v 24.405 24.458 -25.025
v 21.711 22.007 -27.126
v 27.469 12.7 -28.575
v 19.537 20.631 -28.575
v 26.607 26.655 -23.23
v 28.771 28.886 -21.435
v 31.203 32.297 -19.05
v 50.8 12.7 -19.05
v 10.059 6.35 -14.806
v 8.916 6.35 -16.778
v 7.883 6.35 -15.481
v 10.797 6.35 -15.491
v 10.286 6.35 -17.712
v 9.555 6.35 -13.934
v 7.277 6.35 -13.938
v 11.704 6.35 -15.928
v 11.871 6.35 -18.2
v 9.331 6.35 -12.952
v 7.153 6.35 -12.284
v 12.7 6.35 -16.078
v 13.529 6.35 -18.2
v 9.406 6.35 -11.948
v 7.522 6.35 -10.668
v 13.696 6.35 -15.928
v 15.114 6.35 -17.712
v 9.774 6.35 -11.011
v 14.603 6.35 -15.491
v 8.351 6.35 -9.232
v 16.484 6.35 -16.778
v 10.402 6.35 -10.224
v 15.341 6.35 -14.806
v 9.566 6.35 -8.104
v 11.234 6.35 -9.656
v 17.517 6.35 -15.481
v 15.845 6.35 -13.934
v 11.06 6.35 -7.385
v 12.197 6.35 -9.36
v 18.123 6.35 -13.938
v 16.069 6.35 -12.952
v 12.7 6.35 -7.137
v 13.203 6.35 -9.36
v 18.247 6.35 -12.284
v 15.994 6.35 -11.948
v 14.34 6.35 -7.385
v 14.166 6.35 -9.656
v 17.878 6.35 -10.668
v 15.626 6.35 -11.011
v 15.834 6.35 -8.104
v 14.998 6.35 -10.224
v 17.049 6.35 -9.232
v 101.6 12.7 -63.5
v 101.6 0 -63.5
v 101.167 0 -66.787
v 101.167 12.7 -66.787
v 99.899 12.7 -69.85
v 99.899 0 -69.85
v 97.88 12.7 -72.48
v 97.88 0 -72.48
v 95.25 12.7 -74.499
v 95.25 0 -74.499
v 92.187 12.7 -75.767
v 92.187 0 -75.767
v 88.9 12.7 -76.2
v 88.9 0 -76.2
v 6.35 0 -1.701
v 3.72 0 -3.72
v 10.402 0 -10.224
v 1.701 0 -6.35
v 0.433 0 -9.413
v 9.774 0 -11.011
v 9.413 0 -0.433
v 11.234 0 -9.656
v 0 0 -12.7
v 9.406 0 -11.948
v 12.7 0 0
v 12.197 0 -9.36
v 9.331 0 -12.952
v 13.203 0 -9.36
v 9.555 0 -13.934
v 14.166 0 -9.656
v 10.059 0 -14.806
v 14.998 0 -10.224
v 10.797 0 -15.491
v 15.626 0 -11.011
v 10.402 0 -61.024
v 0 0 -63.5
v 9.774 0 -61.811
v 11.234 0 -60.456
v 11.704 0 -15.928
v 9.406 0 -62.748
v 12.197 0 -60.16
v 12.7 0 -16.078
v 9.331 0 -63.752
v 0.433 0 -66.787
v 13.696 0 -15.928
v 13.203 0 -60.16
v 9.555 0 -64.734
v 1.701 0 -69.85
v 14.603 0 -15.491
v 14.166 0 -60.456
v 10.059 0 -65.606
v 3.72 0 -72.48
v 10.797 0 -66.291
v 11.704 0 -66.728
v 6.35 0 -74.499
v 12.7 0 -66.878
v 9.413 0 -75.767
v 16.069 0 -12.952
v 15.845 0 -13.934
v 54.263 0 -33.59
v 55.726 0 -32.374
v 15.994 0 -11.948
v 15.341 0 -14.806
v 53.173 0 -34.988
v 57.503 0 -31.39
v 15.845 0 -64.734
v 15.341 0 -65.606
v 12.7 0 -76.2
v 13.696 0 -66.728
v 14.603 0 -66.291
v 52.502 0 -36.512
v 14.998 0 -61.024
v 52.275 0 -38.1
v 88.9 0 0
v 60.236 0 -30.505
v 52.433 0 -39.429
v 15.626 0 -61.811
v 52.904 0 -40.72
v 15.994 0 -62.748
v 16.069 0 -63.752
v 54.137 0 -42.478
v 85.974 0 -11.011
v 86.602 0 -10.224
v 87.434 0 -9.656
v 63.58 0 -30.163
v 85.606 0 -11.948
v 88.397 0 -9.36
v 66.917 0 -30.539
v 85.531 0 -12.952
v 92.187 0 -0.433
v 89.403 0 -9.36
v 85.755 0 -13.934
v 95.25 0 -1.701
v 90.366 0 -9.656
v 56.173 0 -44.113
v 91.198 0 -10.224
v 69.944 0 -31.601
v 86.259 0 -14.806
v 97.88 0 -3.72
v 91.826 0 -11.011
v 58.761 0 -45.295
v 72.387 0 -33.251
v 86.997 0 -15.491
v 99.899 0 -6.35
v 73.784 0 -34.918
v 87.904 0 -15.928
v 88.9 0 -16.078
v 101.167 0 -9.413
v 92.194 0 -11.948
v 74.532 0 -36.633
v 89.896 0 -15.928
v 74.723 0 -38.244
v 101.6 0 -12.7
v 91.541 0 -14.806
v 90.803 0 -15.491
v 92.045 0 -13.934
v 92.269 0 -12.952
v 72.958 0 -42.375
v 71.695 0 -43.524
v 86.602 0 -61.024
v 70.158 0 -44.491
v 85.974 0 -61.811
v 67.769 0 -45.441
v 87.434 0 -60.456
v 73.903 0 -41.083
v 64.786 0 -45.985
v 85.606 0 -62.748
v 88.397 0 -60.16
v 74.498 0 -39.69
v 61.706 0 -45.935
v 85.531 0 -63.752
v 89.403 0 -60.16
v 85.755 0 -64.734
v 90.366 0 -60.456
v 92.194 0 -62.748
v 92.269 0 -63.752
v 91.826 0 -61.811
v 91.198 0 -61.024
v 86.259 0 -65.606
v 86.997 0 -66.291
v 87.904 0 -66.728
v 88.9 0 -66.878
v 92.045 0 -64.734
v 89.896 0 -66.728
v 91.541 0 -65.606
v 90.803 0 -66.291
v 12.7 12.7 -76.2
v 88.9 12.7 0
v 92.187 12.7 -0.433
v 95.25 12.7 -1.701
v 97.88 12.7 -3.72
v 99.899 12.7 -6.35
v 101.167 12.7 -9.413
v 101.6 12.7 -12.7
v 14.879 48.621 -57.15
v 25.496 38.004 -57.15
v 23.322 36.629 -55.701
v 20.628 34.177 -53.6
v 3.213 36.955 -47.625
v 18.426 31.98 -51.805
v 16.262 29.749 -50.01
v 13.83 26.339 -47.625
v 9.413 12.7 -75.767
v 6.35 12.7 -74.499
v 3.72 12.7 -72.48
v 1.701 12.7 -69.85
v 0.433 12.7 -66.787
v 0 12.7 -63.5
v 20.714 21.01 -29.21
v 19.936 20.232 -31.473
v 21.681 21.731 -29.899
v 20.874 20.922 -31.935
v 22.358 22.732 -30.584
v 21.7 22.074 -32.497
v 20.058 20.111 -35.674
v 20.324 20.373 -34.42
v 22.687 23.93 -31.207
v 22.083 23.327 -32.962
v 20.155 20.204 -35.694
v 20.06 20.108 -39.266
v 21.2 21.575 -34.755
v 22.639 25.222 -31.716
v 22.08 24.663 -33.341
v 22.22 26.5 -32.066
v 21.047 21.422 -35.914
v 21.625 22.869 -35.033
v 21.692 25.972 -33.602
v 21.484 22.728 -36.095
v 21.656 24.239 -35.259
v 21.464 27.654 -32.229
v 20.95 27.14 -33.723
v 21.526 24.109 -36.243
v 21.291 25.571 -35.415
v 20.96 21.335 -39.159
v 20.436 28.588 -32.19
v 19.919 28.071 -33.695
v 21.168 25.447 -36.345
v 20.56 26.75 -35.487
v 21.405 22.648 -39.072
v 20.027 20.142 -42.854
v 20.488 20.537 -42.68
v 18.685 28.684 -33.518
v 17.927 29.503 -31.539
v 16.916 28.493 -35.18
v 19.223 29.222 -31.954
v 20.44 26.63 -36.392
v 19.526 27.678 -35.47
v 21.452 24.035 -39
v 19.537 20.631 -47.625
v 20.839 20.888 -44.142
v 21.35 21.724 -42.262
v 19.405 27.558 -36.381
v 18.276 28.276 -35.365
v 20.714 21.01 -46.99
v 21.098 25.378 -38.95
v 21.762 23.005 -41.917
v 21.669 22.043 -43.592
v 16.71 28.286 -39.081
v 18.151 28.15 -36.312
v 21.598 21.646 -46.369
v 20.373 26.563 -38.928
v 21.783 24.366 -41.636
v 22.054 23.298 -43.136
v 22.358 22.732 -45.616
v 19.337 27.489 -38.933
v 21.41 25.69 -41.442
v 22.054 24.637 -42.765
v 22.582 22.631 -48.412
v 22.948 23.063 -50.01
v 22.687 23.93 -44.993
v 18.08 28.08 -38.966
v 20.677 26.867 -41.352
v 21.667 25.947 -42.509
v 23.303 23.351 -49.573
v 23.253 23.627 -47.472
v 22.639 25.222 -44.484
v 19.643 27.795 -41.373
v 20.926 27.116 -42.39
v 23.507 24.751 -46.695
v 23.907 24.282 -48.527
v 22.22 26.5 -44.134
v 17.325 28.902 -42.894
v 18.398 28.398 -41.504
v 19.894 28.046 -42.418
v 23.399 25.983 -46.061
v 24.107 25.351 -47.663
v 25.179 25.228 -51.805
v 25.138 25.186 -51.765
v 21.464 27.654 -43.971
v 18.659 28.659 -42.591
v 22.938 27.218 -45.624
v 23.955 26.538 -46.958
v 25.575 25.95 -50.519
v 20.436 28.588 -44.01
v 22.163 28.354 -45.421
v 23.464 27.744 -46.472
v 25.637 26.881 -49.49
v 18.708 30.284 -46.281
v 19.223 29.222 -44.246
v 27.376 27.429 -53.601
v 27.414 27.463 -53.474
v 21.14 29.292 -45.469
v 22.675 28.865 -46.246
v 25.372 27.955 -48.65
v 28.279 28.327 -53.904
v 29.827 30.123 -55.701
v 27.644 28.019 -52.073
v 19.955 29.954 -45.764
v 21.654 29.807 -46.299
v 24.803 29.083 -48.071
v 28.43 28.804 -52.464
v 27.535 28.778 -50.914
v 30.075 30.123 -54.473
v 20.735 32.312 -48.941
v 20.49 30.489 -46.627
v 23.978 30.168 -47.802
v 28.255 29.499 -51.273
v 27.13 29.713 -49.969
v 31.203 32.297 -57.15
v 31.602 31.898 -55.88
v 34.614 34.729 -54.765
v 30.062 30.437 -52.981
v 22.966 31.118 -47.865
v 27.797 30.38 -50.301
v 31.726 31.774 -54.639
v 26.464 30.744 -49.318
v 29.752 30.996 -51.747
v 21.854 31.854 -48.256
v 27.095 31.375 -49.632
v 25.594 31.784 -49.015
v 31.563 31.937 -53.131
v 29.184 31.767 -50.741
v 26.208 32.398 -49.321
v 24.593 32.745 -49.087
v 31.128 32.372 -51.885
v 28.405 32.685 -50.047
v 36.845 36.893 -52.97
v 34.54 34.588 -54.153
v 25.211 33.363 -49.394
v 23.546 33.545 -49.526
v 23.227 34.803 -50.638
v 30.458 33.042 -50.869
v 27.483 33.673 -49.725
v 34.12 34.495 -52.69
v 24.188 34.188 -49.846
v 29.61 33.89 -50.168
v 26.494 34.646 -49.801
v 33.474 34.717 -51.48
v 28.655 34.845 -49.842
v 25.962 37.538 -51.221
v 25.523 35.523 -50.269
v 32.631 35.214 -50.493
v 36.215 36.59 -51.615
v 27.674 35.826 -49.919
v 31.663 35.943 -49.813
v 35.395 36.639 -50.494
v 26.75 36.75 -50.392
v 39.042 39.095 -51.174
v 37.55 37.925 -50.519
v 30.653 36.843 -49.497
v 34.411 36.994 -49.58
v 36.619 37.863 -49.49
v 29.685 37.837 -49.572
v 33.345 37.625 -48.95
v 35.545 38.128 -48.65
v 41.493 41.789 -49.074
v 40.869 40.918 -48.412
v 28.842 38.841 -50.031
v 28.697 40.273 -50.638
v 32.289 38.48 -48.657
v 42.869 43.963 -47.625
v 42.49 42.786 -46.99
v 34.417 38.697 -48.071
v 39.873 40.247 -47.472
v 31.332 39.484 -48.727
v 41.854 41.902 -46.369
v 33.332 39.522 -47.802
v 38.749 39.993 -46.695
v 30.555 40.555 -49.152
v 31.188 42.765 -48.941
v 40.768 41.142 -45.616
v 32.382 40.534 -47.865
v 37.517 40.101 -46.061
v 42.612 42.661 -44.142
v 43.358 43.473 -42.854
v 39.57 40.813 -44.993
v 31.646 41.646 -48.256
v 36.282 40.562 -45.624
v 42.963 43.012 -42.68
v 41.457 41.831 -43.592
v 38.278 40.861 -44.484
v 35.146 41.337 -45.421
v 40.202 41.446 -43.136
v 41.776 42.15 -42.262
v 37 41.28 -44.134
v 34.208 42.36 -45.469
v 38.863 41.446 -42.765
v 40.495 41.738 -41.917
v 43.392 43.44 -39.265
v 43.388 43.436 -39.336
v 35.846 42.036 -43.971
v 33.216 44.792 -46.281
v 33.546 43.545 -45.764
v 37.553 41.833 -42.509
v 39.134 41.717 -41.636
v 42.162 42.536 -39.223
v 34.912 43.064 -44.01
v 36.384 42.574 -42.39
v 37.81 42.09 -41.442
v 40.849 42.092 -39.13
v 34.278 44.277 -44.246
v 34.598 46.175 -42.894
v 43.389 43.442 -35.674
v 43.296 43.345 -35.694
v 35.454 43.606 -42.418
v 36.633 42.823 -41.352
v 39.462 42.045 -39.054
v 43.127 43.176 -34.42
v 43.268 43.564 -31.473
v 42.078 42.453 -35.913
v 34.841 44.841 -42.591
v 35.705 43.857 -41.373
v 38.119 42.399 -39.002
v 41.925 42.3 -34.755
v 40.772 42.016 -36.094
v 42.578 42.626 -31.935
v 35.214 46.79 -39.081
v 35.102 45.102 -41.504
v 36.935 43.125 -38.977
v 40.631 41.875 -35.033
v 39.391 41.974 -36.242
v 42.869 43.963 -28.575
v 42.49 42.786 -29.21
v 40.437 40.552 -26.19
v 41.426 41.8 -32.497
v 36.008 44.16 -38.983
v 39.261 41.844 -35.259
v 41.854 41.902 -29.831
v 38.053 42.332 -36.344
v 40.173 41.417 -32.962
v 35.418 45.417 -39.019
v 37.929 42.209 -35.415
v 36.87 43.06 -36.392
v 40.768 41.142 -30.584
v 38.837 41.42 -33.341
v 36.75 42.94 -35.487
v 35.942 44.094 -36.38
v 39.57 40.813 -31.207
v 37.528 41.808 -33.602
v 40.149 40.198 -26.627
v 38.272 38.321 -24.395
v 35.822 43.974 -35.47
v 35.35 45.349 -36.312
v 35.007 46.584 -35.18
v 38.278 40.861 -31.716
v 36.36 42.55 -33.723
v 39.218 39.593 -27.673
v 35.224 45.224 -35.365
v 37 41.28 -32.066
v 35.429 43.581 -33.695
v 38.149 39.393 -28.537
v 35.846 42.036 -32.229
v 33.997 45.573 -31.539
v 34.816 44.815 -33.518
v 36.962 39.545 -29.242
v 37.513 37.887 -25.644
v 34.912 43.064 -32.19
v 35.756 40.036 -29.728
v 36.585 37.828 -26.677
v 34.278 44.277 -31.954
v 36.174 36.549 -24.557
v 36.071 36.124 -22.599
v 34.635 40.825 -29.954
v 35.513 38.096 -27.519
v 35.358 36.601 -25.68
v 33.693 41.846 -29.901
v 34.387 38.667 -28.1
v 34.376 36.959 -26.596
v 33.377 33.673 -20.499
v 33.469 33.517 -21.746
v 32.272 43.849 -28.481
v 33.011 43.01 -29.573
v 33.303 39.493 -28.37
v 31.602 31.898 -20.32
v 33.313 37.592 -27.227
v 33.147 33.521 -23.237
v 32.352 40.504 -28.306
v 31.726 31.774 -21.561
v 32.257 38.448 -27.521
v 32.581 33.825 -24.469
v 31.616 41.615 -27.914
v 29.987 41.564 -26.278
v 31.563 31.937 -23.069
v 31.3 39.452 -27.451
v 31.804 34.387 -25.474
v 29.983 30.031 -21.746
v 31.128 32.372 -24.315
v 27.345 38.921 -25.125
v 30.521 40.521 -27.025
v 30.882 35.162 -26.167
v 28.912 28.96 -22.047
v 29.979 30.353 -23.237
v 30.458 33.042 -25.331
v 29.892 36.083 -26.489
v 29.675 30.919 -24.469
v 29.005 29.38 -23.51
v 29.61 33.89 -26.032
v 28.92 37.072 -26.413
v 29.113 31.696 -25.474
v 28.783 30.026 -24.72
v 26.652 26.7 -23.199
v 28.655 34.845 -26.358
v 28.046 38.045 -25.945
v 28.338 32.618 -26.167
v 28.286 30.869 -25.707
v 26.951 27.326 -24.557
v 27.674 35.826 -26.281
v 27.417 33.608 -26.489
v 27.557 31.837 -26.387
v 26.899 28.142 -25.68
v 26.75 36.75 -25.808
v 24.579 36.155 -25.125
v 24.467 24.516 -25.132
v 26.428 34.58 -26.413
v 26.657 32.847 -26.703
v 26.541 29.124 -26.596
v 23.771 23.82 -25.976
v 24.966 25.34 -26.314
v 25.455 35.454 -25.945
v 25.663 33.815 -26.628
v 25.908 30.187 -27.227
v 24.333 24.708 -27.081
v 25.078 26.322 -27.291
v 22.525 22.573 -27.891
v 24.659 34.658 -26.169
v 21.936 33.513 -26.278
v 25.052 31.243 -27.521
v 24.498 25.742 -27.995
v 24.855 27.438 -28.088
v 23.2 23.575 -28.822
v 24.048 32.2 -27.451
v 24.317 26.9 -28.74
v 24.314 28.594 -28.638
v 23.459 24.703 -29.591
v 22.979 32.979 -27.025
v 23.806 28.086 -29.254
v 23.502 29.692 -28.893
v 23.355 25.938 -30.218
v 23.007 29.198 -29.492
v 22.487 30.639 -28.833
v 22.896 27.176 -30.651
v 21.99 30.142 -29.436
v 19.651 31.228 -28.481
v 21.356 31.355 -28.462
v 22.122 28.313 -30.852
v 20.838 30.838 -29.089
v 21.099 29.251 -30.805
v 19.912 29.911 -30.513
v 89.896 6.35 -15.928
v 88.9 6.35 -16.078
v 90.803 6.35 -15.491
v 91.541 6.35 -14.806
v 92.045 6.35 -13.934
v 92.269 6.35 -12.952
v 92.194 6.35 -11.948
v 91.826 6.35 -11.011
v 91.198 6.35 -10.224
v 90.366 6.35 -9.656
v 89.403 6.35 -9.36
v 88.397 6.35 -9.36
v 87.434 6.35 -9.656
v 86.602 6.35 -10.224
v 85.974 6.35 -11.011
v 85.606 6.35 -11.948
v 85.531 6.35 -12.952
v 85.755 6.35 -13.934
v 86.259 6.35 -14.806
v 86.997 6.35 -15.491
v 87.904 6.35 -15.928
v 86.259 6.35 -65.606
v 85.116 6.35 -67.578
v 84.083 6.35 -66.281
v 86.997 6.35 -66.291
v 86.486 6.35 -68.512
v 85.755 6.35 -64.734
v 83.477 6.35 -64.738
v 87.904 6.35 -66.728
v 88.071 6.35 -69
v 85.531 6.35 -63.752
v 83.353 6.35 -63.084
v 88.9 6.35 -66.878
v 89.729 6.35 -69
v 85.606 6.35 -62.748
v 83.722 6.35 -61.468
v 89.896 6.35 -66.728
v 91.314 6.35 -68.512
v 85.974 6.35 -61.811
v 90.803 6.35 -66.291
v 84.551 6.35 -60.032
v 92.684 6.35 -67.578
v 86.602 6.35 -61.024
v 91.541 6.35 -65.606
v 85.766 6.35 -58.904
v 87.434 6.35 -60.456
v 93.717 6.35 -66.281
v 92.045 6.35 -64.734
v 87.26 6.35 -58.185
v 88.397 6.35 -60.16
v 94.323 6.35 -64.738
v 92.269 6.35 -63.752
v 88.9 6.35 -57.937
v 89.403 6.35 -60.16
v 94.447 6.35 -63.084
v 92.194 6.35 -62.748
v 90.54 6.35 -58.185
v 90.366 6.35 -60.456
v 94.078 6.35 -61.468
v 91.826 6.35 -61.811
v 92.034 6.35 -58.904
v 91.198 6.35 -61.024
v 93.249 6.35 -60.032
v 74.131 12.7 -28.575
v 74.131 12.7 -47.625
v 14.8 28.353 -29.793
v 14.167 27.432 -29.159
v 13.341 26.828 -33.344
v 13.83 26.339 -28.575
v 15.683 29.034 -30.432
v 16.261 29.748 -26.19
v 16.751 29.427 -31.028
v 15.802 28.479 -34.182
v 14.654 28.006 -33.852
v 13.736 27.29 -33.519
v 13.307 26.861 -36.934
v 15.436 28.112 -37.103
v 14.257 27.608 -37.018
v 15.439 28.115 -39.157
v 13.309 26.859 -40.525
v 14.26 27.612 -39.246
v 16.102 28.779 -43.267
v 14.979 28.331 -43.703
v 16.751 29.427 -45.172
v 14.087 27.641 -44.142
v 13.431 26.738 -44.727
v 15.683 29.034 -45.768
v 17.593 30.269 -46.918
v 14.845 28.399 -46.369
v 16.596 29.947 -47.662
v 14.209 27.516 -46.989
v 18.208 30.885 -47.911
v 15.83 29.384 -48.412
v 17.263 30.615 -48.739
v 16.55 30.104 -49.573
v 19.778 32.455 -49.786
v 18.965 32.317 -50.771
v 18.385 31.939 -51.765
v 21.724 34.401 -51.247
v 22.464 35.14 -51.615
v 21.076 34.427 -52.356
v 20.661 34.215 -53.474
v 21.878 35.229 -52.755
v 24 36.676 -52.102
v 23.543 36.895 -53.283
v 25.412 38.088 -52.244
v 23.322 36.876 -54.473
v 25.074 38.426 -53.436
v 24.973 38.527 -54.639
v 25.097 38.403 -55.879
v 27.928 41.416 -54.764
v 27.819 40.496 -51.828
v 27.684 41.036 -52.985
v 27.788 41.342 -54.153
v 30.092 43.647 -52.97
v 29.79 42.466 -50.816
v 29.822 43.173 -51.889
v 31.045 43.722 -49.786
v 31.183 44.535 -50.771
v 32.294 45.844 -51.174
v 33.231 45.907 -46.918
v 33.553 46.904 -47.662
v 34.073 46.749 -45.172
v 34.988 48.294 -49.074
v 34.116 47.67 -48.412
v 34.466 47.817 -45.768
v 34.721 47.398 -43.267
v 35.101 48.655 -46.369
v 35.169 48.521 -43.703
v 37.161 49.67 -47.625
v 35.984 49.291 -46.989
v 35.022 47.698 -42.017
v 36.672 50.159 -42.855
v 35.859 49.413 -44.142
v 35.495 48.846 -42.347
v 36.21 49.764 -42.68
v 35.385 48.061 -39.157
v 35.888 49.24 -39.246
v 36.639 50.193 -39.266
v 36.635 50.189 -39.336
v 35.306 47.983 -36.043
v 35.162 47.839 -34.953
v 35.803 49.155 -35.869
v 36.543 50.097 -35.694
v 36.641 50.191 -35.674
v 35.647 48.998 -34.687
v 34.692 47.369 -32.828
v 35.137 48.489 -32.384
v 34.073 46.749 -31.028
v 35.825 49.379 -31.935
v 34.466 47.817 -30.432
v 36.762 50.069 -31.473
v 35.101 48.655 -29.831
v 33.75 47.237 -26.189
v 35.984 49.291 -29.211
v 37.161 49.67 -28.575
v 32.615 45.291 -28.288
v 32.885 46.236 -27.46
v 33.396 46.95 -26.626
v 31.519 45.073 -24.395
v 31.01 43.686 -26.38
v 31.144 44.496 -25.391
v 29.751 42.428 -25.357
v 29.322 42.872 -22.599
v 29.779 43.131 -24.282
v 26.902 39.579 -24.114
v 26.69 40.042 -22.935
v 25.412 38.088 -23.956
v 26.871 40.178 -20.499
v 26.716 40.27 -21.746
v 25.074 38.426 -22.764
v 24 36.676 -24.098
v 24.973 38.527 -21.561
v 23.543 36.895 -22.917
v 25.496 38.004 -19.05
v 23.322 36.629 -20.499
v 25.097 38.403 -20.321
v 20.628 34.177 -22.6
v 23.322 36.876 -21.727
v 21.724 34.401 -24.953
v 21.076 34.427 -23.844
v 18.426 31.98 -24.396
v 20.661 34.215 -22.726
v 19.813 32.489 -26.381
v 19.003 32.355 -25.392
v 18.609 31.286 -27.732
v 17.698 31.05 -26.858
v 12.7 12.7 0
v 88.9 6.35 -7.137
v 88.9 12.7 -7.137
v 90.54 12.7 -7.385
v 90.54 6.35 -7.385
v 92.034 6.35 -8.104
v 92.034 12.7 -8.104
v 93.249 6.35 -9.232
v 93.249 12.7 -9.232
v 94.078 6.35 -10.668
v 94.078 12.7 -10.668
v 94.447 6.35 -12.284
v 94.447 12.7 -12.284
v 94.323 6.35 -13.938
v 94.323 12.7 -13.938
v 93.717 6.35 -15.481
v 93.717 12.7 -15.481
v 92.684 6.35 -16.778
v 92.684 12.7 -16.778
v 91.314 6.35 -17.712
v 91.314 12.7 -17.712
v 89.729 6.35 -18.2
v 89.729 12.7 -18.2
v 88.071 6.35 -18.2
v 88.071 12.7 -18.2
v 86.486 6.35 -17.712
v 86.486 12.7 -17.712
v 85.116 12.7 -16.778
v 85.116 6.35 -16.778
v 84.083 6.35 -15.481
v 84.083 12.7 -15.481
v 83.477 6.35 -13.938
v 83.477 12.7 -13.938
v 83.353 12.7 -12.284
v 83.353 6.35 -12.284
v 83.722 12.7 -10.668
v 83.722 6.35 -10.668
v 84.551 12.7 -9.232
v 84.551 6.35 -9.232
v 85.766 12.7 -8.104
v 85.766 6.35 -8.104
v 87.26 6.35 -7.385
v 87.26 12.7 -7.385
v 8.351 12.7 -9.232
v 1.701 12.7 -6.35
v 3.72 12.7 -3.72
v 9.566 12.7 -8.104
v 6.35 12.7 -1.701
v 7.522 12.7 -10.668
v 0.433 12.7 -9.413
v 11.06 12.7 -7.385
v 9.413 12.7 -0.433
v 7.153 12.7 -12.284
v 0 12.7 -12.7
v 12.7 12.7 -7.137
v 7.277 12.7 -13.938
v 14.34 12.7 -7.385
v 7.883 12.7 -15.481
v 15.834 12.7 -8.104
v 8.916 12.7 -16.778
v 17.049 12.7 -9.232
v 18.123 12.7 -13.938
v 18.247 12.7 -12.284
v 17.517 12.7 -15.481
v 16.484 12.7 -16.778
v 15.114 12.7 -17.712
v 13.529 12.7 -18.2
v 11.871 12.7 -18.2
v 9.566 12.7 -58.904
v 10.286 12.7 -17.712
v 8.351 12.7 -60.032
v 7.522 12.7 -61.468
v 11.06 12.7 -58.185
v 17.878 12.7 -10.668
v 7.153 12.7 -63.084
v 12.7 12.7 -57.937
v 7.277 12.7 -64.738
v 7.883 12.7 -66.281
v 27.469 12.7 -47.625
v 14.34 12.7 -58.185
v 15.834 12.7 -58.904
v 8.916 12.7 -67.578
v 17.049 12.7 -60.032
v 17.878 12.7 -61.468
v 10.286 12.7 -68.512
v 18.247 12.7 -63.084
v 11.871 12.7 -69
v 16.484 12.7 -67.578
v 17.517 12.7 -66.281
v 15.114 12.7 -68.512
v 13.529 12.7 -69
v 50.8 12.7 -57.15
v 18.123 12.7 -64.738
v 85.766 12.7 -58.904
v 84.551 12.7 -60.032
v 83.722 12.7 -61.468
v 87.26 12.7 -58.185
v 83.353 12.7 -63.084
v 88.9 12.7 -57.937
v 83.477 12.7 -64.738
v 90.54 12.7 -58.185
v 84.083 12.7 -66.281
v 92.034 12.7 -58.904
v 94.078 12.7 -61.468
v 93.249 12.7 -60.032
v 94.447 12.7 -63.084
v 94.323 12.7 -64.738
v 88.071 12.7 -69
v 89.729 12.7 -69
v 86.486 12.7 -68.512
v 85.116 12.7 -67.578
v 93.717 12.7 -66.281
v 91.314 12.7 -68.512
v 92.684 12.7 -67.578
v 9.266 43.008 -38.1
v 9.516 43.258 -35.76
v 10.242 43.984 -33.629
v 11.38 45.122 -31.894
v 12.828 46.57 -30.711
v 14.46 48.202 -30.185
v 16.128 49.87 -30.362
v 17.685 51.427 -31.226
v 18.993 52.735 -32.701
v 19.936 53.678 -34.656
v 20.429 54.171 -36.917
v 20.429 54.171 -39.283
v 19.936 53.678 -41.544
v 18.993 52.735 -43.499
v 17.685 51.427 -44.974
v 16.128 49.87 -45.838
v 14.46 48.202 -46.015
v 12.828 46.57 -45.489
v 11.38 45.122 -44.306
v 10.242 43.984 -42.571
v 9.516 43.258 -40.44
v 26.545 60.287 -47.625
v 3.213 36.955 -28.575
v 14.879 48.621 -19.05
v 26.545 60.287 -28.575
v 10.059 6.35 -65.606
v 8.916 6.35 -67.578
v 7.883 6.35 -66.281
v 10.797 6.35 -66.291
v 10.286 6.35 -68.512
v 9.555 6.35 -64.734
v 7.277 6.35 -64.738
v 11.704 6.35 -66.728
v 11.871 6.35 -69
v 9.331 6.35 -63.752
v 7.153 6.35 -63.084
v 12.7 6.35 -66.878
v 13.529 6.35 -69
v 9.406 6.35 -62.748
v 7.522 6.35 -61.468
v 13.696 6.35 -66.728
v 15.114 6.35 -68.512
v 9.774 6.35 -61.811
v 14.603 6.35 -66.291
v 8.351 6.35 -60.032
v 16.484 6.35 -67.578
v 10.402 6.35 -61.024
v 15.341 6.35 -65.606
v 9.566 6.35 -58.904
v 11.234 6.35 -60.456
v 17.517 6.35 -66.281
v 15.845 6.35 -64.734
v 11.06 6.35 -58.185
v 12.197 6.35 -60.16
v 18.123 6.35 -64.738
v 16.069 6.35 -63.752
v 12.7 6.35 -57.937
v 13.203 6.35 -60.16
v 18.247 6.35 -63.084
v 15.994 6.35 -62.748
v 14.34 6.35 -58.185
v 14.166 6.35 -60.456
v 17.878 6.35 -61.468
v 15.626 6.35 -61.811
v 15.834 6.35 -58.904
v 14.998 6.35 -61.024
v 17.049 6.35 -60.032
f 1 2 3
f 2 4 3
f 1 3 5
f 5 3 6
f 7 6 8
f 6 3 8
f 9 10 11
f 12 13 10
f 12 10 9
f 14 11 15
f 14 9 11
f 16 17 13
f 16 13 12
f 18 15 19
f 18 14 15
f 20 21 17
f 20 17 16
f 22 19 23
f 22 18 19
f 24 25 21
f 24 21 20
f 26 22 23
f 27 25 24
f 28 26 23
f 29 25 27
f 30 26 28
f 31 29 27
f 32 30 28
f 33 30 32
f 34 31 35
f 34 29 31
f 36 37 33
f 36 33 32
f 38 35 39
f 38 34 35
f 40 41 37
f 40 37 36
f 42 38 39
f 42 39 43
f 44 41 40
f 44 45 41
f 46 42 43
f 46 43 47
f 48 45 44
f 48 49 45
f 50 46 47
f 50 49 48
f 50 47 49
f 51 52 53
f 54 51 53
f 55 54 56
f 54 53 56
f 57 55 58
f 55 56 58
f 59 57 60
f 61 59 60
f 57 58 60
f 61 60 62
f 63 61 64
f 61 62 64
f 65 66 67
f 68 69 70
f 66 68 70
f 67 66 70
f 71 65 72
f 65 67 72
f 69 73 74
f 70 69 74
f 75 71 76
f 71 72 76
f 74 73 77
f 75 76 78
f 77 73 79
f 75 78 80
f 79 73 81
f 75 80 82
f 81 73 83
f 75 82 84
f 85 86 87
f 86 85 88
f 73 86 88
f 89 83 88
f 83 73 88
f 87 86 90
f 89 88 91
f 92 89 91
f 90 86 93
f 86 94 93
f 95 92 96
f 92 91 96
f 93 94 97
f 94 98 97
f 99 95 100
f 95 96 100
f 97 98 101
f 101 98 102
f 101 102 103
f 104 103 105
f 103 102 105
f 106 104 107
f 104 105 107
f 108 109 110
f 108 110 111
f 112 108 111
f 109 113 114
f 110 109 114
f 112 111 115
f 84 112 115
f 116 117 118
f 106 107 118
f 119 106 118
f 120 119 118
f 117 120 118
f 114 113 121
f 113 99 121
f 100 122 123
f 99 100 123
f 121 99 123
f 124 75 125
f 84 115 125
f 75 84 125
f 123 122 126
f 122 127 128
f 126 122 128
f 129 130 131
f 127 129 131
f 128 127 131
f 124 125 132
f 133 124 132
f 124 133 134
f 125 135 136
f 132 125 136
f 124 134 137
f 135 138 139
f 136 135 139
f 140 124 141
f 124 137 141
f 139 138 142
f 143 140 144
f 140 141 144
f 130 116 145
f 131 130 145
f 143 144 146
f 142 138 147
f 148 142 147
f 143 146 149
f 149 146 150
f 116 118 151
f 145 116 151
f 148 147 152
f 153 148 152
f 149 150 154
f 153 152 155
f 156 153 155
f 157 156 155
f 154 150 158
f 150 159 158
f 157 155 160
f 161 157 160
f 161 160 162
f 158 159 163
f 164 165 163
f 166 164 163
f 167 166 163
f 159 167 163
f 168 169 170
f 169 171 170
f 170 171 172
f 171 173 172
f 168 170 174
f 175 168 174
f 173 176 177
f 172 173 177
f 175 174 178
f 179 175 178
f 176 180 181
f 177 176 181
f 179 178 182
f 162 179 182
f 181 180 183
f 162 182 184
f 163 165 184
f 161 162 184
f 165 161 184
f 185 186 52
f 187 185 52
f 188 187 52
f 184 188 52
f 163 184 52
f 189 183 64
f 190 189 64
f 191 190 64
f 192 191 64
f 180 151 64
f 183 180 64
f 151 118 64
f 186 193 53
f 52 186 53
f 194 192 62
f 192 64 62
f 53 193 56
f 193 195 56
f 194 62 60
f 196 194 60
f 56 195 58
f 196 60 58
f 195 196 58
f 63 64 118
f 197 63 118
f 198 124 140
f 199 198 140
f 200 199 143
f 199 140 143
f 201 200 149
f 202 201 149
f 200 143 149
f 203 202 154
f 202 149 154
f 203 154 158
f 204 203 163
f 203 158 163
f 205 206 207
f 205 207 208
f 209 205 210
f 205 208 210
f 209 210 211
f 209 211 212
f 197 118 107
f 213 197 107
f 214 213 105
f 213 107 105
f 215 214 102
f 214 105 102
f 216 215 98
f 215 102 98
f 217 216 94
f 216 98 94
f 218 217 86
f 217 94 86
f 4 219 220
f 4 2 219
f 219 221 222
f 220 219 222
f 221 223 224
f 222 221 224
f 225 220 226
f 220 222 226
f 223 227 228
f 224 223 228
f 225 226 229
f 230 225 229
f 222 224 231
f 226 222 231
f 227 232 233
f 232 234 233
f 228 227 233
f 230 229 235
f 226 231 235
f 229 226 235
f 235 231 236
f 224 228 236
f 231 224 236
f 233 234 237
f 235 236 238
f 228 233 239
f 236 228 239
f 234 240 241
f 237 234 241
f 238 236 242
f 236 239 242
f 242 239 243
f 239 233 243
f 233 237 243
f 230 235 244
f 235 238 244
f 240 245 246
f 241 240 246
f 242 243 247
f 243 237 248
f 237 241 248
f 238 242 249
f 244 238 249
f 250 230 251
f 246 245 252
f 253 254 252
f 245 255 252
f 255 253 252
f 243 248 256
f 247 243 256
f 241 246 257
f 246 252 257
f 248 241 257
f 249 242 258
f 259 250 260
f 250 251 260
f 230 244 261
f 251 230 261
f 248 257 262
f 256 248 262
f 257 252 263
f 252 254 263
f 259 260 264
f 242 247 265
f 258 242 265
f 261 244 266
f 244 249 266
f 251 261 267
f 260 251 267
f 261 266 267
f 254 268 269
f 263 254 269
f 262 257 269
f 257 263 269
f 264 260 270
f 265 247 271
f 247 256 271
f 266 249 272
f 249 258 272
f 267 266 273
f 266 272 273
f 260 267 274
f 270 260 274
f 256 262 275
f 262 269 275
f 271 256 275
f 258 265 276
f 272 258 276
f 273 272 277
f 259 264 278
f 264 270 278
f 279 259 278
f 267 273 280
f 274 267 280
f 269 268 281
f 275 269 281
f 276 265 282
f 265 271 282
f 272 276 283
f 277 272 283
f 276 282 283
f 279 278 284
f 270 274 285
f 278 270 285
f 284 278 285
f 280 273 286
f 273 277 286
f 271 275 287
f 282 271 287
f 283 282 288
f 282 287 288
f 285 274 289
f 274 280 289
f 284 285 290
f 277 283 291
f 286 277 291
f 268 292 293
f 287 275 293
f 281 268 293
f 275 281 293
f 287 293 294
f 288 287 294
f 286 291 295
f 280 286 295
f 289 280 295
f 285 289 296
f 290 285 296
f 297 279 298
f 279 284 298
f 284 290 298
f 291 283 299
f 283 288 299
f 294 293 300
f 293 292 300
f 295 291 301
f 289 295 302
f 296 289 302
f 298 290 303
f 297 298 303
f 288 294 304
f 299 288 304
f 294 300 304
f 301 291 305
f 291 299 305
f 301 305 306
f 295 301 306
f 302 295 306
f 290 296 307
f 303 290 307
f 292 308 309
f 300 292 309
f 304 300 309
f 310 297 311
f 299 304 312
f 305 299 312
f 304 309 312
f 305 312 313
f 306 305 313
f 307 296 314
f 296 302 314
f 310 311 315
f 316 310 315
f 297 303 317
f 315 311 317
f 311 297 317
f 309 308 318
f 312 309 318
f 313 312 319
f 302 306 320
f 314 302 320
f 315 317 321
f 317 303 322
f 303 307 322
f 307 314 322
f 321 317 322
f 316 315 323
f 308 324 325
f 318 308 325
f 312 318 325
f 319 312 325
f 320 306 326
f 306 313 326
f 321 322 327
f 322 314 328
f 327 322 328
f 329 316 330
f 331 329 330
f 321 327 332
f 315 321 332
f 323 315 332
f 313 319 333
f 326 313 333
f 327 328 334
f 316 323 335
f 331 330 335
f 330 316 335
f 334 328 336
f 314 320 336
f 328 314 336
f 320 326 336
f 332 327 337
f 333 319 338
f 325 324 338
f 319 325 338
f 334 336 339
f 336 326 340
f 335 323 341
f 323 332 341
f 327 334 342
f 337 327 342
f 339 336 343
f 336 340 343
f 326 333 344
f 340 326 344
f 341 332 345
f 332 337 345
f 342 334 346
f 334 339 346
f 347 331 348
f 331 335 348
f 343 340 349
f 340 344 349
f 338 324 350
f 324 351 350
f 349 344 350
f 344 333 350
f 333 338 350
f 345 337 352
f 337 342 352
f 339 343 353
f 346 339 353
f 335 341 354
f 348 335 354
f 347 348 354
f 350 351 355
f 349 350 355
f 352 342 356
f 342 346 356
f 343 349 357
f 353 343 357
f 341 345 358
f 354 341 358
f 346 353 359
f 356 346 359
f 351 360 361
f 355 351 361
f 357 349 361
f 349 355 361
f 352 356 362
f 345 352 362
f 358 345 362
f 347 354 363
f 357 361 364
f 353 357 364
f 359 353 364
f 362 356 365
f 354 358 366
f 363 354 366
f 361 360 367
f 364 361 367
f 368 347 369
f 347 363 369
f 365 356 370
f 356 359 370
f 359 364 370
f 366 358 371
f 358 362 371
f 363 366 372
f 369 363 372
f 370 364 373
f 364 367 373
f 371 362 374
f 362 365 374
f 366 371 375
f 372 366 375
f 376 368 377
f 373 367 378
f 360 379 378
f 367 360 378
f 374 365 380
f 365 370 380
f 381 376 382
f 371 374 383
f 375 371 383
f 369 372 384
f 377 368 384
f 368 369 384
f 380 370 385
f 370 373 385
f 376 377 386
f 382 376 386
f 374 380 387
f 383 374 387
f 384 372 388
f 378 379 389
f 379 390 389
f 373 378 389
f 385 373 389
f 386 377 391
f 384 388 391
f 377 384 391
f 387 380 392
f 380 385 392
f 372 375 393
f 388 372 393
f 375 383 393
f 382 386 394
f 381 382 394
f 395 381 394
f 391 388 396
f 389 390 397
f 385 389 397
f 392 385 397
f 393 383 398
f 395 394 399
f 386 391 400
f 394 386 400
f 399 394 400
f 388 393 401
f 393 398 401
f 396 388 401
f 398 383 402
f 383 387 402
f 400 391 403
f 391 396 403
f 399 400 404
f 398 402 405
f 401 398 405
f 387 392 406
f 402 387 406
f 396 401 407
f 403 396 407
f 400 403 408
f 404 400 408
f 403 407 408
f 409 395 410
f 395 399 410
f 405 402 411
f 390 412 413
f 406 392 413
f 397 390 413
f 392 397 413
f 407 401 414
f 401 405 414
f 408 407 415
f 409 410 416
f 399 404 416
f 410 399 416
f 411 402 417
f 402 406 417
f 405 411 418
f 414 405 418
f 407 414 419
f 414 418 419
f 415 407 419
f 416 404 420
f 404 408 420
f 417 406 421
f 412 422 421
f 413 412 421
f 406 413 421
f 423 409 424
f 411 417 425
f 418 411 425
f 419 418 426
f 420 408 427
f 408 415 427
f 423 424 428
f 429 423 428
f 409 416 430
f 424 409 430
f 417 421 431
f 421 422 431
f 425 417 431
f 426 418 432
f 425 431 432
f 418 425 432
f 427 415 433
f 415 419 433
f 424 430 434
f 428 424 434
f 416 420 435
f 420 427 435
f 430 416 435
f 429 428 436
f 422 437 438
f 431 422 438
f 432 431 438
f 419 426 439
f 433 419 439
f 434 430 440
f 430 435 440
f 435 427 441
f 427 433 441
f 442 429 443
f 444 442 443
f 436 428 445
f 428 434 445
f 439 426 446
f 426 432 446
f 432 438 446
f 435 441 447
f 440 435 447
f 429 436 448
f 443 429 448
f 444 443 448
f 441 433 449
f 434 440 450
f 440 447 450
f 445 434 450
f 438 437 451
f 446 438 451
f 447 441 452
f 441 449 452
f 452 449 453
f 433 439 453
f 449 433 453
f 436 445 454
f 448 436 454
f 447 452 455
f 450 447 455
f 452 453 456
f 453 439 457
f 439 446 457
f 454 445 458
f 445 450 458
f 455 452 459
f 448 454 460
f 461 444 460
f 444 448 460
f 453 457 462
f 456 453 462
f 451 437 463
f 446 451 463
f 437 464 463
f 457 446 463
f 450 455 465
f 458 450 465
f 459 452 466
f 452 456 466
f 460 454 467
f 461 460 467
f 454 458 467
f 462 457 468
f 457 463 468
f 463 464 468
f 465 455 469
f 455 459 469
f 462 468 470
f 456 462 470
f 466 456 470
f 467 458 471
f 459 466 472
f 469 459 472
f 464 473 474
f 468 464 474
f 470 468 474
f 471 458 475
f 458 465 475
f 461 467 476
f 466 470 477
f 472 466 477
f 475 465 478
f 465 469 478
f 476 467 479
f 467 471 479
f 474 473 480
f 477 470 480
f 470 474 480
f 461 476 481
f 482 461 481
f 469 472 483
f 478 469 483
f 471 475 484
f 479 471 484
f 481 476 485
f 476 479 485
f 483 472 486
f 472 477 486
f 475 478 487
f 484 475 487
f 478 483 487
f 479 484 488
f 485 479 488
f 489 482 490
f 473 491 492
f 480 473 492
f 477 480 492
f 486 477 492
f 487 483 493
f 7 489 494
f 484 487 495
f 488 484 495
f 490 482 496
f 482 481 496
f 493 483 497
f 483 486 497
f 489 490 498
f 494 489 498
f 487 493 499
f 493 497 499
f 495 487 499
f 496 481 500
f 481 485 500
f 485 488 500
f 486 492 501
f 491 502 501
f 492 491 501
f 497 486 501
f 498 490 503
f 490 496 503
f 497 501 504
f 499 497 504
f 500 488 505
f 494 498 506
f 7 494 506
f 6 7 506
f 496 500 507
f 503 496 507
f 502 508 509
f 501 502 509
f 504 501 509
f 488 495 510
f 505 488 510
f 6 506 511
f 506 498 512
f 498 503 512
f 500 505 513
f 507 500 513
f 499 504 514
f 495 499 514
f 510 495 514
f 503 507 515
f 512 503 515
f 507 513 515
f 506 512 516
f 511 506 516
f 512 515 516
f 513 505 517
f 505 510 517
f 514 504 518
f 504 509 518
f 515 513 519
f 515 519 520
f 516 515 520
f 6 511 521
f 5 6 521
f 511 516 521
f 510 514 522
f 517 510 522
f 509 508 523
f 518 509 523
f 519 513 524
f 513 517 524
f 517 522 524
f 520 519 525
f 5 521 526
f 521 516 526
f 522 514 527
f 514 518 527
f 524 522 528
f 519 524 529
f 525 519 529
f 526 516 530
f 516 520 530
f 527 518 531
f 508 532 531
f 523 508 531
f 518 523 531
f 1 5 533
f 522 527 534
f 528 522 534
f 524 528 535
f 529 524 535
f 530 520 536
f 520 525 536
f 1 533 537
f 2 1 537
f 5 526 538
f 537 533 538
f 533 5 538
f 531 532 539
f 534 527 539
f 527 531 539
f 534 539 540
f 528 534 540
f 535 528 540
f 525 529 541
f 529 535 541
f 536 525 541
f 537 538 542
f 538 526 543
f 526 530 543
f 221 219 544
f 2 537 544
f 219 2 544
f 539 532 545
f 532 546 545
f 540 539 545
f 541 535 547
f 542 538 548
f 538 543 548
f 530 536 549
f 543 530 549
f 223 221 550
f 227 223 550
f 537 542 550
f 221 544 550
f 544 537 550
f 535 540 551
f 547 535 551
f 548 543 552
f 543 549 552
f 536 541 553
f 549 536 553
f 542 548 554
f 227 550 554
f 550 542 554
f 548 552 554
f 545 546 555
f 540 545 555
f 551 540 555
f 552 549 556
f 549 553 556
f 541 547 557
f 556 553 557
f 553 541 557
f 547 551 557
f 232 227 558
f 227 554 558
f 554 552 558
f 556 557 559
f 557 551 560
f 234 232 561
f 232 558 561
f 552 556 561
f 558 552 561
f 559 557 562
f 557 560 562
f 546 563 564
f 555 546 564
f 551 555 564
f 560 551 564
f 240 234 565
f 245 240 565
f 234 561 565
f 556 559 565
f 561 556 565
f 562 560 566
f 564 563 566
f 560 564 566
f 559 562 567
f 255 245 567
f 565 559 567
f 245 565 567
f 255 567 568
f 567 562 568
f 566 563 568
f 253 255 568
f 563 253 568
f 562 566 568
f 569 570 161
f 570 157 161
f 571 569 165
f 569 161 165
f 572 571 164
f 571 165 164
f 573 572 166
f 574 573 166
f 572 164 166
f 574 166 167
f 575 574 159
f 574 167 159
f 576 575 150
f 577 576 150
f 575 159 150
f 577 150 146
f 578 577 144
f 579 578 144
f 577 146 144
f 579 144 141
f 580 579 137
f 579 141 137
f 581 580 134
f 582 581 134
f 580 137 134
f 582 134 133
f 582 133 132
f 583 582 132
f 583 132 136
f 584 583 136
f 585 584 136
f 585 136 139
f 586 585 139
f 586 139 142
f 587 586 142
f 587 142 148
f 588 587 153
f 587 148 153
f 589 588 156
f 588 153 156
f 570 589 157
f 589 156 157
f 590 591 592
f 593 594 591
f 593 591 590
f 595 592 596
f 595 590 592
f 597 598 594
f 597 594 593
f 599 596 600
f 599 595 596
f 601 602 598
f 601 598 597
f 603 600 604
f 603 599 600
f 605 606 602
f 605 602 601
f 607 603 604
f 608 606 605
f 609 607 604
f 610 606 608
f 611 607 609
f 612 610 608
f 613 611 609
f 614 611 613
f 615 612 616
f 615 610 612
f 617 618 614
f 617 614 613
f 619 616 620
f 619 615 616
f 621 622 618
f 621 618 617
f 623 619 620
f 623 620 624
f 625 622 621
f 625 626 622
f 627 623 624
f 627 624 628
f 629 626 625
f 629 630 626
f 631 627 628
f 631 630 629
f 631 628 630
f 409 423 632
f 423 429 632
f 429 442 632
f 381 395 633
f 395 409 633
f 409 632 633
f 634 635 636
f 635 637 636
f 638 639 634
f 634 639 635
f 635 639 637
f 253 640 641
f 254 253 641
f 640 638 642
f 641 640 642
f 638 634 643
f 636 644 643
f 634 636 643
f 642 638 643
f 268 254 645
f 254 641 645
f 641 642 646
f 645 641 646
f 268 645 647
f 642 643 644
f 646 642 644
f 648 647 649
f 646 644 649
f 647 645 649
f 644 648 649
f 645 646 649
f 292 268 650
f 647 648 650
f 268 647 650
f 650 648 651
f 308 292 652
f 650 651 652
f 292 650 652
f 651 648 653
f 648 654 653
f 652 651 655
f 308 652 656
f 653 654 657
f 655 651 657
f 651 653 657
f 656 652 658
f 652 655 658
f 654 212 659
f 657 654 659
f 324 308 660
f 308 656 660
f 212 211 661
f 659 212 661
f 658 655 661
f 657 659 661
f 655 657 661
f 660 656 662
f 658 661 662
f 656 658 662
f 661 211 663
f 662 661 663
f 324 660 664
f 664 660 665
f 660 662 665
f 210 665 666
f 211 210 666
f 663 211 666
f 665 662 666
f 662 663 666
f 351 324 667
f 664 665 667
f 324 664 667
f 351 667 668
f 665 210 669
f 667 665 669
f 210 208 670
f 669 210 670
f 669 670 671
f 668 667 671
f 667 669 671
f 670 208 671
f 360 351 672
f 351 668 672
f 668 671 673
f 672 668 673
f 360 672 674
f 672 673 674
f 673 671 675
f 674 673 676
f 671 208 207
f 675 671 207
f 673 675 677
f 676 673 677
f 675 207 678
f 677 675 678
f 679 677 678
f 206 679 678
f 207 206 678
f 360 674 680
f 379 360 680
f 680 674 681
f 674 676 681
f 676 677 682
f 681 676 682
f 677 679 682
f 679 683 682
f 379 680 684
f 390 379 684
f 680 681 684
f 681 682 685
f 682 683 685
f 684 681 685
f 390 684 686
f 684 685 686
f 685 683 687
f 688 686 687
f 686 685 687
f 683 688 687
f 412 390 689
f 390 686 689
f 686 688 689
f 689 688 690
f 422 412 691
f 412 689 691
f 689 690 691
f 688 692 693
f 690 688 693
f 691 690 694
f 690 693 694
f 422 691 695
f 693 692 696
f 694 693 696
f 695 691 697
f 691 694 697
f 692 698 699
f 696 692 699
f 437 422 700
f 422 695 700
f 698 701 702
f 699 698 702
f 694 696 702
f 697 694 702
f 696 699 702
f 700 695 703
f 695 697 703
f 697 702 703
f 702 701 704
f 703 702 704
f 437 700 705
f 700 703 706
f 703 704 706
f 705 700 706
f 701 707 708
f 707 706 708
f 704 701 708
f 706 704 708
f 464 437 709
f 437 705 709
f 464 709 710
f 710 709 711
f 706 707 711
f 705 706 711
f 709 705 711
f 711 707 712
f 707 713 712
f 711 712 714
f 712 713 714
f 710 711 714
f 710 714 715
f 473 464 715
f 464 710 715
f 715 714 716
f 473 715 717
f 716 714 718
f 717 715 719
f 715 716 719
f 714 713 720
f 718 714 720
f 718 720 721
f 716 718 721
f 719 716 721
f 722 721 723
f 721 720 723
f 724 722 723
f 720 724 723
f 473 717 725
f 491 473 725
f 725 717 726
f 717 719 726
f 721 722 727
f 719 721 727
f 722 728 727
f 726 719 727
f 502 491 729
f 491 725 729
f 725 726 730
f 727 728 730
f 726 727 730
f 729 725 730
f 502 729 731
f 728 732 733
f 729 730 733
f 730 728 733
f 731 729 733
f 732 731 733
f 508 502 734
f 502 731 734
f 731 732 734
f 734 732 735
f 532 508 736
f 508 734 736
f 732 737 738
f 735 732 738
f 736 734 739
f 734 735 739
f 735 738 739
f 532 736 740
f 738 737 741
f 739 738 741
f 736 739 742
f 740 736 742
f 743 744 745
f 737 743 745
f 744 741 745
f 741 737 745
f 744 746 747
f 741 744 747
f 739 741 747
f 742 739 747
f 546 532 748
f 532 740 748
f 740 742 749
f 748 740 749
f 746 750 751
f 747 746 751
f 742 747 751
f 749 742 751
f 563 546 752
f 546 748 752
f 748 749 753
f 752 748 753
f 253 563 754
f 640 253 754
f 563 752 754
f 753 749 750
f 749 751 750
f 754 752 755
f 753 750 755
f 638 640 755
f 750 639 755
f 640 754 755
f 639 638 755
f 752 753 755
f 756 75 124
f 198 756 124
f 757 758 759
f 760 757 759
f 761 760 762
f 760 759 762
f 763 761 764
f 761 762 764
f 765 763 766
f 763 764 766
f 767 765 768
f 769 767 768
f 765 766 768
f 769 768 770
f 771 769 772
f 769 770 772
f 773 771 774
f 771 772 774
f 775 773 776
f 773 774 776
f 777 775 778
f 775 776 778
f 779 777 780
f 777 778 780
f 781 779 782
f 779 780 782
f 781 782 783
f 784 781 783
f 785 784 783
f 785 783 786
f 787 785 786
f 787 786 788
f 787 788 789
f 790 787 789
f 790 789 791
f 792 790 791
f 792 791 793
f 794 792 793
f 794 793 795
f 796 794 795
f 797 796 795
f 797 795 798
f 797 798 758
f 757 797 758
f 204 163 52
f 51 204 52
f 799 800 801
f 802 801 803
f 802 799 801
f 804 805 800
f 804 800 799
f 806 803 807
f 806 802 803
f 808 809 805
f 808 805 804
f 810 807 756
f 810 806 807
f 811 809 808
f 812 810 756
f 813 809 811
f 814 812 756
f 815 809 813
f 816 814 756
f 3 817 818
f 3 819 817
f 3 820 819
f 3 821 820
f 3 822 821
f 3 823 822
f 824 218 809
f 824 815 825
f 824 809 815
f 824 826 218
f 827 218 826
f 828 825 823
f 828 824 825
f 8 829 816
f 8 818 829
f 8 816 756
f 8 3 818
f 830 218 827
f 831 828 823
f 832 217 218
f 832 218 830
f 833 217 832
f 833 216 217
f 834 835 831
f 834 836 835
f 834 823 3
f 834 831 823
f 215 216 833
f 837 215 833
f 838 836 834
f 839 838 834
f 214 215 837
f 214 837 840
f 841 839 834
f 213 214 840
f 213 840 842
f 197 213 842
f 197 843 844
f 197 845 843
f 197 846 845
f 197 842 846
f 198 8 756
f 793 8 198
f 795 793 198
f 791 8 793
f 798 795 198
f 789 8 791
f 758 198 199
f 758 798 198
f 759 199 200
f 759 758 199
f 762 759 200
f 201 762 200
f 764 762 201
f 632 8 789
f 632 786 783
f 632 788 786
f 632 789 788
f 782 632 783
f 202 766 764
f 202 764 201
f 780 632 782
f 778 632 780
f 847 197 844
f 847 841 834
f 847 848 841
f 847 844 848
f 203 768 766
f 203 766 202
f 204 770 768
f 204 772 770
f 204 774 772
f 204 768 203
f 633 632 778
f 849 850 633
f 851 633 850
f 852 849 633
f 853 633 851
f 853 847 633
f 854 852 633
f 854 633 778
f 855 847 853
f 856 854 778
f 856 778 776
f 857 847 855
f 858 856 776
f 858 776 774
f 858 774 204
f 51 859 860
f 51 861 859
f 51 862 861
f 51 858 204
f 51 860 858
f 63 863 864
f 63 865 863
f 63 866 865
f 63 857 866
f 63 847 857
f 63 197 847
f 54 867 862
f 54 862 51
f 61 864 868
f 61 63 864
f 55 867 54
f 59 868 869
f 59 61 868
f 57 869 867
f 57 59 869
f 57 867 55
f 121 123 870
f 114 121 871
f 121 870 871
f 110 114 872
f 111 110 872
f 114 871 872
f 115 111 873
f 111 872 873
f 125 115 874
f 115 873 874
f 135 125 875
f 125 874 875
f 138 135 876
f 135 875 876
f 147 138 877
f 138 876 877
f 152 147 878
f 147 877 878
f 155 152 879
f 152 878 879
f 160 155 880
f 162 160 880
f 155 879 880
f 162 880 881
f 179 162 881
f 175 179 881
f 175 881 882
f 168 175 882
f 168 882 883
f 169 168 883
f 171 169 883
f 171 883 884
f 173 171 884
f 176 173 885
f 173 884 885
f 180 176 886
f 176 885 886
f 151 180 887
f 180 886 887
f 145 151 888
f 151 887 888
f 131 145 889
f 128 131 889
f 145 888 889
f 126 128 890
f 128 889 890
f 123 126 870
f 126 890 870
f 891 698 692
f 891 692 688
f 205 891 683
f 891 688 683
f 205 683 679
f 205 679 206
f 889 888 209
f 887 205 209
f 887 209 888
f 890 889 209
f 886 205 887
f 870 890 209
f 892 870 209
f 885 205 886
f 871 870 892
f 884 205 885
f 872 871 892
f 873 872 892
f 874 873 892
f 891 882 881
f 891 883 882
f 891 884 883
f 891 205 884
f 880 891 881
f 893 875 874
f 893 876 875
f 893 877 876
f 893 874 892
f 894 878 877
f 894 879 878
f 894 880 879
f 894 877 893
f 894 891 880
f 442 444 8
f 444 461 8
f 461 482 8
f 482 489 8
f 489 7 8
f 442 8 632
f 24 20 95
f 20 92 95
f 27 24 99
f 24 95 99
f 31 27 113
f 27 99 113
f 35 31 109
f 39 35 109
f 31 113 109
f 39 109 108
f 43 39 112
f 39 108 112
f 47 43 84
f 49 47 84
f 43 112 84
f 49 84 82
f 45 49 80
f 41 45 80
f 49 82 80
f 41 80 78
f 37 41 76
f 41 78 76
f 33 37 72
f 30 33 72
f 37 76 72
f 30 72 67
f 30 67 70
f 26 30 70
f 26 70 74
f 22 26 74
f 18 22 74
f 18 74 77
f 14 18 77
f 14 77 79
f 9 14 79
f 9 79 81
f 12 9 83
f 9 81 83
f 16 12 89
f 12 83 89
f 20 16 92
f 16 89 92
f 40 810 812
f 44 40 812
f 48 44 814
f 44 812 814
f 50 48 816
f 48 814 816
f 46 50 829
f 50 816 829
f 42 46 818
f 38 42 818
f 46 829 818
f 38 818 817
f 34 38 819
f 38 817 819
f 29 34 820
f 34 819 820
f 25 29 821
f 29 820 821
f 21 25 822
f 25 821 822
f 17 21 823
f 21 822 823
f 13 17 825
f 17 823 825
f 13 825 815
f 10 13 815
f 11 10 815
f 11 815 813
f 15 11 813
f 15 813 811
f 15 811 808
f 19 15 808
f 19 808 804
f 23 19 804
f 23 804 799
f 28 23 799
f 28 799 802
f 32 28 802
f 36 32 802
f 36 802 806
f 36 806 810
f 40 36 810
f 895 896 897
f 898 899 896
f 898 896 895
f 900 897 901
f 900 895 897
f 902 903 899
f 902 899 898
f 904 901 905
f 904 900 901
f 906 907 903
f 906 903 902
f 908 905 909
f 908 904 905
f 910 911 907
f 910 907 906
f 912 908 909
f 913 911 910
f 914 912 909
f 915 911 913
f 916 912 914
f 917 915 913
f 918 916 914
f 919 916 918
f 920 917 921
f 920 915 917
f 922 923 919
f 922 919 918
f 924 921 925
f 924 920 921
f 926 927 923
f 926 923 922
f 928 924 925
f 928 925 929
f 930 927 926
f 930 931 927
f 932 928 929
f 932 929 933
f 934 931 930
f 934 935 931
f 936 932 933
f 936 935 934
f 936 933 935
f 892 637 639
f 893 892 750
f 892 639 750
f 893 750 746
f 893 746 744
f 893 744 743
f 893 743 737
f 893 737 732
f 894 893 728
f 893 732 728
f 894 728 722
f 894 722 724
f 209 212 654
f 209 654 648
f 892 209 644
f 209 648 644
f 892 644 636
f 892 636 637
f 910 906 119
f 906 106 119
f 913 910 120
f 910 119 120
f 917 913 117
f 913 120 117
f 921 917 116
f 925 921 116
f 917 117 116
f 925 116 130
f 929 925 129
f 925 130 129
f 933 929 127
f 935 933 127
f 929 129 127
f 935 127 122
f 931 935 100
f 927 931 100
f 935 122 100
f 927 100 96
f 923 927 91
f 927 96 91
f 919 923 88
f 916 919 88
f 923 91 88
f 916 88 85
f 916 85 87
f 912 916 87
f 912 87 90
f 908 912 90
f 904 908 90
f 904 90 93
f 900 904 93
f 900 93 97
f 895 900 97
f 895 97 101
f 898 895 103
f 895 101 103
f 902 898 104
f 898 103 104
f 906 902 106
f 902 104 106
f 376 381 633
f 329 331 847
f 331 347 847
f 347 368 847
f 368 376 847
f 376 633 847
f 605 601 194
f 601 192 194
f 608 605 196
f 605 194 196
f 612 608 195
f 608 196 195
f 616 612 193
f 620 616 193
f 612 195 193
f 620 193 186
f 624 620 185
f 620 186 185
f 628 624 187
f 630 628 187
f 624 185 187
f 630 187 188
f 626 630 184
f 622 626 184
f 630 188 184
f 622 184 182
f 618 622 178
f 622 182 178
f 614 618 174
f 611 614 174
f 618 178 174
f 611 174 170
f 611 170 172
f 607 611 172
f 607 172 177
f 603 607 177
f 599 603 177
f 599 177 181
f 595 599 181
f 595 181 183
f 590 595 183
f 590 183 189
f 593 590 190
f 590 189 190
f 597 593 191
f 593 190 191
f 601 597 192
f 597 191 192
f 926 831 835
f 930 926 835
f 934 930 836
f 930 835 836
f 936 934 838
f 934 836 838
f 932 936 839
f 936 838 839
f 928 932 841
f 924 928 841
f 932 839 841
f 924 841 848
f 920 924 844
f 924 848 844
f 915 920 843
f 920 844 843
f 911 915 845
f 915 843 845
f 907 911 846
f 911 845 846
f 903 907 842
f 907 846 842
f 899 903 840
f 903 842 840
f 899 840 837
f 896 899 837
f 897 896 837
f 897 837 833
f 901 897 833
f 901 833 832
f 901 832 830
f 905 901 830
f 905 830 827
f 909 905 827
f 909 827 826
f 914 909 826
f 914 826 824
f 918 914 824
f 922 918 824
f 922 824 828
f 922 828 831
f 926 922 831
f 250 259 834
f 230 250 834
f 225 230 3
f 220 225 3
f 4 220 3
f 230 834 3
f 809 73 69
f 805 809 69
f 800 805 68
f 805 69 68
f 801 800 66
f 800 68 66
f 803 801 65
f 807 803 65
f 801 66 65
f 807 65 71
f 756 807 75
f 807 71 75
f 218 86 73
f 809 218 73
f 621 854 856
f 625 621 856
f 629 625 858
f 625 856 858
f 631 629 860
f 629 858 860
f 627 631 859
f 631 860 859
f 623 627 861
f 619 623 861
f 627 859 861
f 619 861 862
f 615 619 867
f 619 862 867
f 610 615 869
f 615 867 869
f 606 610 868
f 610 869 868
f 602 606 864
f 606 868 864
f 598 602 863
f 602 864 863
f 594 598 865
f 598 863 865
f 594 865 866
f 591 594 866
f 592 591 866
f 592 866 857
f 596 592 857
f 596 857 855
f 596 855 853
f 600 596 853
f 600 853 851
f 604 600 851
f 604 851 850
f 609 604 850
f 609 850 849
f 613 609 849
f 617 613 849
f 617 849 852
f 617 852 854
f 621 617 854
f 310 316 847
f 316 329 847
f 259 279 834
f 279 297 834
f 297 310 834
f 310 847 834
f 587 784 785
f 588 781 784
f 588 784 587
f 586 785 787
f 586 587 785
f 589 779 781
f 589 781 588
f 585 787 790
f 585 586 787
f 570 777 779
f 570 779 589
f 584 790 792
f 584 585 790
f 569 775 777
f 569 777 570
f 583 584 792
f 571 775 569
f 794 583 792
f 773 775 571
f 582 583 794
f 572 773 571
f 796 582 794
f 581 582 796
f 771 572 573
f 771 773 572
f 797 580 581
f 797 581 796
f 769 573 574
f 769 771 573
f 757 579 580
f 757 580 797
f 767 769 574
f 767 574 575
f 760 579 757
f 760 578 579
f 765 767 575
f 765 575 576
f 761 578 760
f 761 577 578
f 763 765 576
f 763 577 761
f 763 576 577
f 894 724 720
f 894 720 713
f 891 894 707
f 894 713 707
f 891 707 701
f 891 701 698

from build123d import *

# Parameters (mm, degrees)
BOSS_EXTRUDE1_DEPTH                                 = 12.7
CBORE_FOR_00_BINDING_HEAD_MACHINE_SCREW_D           = 6.7564
CBORE_FOR_00_BINDING_HEAD_MACHINE_SCREW_CBORE_D     = 11.1252
CBORE_FOR_00_BINDING_HEAD_MACHINE_SCREW_CBORE_DEPTH = 6.35
BOSS_EXTRUDE2_DEPTH                                 = 50.8
BOSS_EXTRUDE2_DEPTH_BACK                            = 50.8
SKETCH10_R                                          = 4.7752
SKETCH11_R                                          = 7.9375
CUT_EXTRUDE1_DEPTH                                  = 148.399953238


with BuildPart() as part:
    # Sketch1 → Boss-Extrude1 (new body)
    with BuildSketch(Plane(origin=(0, 0, 0), x_dir=(1, 0, 0), z_dir=(0, 1, 0))):
        with BuildLine():
            Line((12.7, 0), (88.9, 0))
            ThreePointArc((88.9, 0), (97.880256121, 3.719743879), (101.6, 12.7))
            Line((101.6, 12.7), (101.6, 63.5))
            ThreePointArc((101.6, 63.5), (97.880256121, 72.480256121), (88.9, 76.2))
            Line((88.9, 76.2), (12.7, 76.2))
            ThreePointArc((12.7, 76.2), (3.719743879, 72.480256121), (0, 63.5))
            Line((0, 63.5), (0, 12.7))
            ThreePointArc((0, 12.7), (3.719743879, 3.719743879), (12.7, 0))
        make_face()
    extrude(amount=BOSS_EXTRUDE1_DEPTH)

    # CBORE for #00 Binding Head Machine Screw1 (through all)
    with Locations(Plane(origin=(12.7, 12.7, -12.7), x_dir=(0, 0, 1), z_dir=(0, 1, 0))):
        with Locations((0, 0), (0, 76.2), (-50.8, 76.2), (-50.8, 0)):
            CounterBoreHole(CBORE_FOR_00_BINDING_HEAD_MACHINE_SCREW_D / 2, CBORE_FOR_00_BINDING_HEAD_MACHINE_SCREW_CBORE_D / 2, CBORE_FOR_00_BINDING_HEAD_MACHINE_SCREW_CBORE_DEPTH)


with BuildPart() as body_2:
    # Sketch7 → Boss-Extrude2 (new, two sides: drawn at the far end of the back side and taken through both)
    with BuildSketch(Plane(origin=(19.05, -19.05, 0), x_dir=(0, 0, 1), z_dir=(-0.7071067811865488, 0.7071067811865464, 0)).offset(-BOSS_EXTRUDE2_DEPTH_BACK)):
        Polygon((-57.15, 44.901280605), (-47.625, 28.403496663), (-28.575, 28.403496663), (-19.05, 44.901280605), (-28.575, 61.399064547), (-47.625, 61.399064547), align=None)
    extrude(amount=BOSS_EXTRUDE2_DEPTH + BOSS_EXTRUDE2_DEPTH_BACK)

    # SurfaceCut16: cut with a surface, the side behind it stays
    # Surface-Offset1: a surface, a copy of 1 face of the part
    surface_offset1_1 = part.part.faces().sort_by_distance((50.8, 0, -38.1))[0]
    split(bisect_by=surface_offset1_1, keep=Keep.BOTTOM)

    # Sketch10 → Cut-Revolve1 (revolve, cut)
    with BuildSketch(Plane(origin=(0, 0, -38.1), x_dir=(-1, 0, 0), z_dir=(0, 0, -1)), mode=Mode.PRIVATE) as cut_revolve1_sk:
        with Locations((-40.015054597, 46.816335203)):
            Circle(SKETCH10_R)
    revolve(cut_revolve1_sk.sketch.rotate(Axis((14.878975516, 48.621024484, -38.1), (0.7071067811865499, -0.7071067811865451, 0)), 150.000000006), axis=Axis((14.878975516, 48.621024484, -38.1), (0.7071067811865499, -0.7071067811865451, 0)), mode=Mode.SUBTRACT)


with BuildPart() as cut_extrude1_tool:
    # Sketch11 → Cut-Extrude1 (new, through all)
    with BuildSketch(Plane(origin=(-16.871024484, 16.871024484, 0), x_dir=(0, 0, 1), z_dir=(-0.7071067811865488, 0.7071067811865462, 0))):
        with Locations(Location((-38.1, 44.901280605, 0), (0, 0, 270))):
            Circle(SKETCH11_R)
    extrude(amount=-CUT_EXTRUDE1_DEPTH)


with BuildPart() as part_1:
    add(part.part)

    # Cut-Extrude1: cut by cut_extrude1_tool
    add(cut_extrude1_tool.part, mode=Mode.SUBTRACT)


with BuildPart() as body_2_1:
    add(body_2.part)

    # Cut-Extrude1: cut by cut_extrude1_tool
    add(cut_extrude1_tool.part, mode=Mode.SUBTRACT)


with BuildPart() as part_2:
    add(part_1.part)

    # Combine1: union body 2
    add(body_2_1.part)


solid = part_2.part
